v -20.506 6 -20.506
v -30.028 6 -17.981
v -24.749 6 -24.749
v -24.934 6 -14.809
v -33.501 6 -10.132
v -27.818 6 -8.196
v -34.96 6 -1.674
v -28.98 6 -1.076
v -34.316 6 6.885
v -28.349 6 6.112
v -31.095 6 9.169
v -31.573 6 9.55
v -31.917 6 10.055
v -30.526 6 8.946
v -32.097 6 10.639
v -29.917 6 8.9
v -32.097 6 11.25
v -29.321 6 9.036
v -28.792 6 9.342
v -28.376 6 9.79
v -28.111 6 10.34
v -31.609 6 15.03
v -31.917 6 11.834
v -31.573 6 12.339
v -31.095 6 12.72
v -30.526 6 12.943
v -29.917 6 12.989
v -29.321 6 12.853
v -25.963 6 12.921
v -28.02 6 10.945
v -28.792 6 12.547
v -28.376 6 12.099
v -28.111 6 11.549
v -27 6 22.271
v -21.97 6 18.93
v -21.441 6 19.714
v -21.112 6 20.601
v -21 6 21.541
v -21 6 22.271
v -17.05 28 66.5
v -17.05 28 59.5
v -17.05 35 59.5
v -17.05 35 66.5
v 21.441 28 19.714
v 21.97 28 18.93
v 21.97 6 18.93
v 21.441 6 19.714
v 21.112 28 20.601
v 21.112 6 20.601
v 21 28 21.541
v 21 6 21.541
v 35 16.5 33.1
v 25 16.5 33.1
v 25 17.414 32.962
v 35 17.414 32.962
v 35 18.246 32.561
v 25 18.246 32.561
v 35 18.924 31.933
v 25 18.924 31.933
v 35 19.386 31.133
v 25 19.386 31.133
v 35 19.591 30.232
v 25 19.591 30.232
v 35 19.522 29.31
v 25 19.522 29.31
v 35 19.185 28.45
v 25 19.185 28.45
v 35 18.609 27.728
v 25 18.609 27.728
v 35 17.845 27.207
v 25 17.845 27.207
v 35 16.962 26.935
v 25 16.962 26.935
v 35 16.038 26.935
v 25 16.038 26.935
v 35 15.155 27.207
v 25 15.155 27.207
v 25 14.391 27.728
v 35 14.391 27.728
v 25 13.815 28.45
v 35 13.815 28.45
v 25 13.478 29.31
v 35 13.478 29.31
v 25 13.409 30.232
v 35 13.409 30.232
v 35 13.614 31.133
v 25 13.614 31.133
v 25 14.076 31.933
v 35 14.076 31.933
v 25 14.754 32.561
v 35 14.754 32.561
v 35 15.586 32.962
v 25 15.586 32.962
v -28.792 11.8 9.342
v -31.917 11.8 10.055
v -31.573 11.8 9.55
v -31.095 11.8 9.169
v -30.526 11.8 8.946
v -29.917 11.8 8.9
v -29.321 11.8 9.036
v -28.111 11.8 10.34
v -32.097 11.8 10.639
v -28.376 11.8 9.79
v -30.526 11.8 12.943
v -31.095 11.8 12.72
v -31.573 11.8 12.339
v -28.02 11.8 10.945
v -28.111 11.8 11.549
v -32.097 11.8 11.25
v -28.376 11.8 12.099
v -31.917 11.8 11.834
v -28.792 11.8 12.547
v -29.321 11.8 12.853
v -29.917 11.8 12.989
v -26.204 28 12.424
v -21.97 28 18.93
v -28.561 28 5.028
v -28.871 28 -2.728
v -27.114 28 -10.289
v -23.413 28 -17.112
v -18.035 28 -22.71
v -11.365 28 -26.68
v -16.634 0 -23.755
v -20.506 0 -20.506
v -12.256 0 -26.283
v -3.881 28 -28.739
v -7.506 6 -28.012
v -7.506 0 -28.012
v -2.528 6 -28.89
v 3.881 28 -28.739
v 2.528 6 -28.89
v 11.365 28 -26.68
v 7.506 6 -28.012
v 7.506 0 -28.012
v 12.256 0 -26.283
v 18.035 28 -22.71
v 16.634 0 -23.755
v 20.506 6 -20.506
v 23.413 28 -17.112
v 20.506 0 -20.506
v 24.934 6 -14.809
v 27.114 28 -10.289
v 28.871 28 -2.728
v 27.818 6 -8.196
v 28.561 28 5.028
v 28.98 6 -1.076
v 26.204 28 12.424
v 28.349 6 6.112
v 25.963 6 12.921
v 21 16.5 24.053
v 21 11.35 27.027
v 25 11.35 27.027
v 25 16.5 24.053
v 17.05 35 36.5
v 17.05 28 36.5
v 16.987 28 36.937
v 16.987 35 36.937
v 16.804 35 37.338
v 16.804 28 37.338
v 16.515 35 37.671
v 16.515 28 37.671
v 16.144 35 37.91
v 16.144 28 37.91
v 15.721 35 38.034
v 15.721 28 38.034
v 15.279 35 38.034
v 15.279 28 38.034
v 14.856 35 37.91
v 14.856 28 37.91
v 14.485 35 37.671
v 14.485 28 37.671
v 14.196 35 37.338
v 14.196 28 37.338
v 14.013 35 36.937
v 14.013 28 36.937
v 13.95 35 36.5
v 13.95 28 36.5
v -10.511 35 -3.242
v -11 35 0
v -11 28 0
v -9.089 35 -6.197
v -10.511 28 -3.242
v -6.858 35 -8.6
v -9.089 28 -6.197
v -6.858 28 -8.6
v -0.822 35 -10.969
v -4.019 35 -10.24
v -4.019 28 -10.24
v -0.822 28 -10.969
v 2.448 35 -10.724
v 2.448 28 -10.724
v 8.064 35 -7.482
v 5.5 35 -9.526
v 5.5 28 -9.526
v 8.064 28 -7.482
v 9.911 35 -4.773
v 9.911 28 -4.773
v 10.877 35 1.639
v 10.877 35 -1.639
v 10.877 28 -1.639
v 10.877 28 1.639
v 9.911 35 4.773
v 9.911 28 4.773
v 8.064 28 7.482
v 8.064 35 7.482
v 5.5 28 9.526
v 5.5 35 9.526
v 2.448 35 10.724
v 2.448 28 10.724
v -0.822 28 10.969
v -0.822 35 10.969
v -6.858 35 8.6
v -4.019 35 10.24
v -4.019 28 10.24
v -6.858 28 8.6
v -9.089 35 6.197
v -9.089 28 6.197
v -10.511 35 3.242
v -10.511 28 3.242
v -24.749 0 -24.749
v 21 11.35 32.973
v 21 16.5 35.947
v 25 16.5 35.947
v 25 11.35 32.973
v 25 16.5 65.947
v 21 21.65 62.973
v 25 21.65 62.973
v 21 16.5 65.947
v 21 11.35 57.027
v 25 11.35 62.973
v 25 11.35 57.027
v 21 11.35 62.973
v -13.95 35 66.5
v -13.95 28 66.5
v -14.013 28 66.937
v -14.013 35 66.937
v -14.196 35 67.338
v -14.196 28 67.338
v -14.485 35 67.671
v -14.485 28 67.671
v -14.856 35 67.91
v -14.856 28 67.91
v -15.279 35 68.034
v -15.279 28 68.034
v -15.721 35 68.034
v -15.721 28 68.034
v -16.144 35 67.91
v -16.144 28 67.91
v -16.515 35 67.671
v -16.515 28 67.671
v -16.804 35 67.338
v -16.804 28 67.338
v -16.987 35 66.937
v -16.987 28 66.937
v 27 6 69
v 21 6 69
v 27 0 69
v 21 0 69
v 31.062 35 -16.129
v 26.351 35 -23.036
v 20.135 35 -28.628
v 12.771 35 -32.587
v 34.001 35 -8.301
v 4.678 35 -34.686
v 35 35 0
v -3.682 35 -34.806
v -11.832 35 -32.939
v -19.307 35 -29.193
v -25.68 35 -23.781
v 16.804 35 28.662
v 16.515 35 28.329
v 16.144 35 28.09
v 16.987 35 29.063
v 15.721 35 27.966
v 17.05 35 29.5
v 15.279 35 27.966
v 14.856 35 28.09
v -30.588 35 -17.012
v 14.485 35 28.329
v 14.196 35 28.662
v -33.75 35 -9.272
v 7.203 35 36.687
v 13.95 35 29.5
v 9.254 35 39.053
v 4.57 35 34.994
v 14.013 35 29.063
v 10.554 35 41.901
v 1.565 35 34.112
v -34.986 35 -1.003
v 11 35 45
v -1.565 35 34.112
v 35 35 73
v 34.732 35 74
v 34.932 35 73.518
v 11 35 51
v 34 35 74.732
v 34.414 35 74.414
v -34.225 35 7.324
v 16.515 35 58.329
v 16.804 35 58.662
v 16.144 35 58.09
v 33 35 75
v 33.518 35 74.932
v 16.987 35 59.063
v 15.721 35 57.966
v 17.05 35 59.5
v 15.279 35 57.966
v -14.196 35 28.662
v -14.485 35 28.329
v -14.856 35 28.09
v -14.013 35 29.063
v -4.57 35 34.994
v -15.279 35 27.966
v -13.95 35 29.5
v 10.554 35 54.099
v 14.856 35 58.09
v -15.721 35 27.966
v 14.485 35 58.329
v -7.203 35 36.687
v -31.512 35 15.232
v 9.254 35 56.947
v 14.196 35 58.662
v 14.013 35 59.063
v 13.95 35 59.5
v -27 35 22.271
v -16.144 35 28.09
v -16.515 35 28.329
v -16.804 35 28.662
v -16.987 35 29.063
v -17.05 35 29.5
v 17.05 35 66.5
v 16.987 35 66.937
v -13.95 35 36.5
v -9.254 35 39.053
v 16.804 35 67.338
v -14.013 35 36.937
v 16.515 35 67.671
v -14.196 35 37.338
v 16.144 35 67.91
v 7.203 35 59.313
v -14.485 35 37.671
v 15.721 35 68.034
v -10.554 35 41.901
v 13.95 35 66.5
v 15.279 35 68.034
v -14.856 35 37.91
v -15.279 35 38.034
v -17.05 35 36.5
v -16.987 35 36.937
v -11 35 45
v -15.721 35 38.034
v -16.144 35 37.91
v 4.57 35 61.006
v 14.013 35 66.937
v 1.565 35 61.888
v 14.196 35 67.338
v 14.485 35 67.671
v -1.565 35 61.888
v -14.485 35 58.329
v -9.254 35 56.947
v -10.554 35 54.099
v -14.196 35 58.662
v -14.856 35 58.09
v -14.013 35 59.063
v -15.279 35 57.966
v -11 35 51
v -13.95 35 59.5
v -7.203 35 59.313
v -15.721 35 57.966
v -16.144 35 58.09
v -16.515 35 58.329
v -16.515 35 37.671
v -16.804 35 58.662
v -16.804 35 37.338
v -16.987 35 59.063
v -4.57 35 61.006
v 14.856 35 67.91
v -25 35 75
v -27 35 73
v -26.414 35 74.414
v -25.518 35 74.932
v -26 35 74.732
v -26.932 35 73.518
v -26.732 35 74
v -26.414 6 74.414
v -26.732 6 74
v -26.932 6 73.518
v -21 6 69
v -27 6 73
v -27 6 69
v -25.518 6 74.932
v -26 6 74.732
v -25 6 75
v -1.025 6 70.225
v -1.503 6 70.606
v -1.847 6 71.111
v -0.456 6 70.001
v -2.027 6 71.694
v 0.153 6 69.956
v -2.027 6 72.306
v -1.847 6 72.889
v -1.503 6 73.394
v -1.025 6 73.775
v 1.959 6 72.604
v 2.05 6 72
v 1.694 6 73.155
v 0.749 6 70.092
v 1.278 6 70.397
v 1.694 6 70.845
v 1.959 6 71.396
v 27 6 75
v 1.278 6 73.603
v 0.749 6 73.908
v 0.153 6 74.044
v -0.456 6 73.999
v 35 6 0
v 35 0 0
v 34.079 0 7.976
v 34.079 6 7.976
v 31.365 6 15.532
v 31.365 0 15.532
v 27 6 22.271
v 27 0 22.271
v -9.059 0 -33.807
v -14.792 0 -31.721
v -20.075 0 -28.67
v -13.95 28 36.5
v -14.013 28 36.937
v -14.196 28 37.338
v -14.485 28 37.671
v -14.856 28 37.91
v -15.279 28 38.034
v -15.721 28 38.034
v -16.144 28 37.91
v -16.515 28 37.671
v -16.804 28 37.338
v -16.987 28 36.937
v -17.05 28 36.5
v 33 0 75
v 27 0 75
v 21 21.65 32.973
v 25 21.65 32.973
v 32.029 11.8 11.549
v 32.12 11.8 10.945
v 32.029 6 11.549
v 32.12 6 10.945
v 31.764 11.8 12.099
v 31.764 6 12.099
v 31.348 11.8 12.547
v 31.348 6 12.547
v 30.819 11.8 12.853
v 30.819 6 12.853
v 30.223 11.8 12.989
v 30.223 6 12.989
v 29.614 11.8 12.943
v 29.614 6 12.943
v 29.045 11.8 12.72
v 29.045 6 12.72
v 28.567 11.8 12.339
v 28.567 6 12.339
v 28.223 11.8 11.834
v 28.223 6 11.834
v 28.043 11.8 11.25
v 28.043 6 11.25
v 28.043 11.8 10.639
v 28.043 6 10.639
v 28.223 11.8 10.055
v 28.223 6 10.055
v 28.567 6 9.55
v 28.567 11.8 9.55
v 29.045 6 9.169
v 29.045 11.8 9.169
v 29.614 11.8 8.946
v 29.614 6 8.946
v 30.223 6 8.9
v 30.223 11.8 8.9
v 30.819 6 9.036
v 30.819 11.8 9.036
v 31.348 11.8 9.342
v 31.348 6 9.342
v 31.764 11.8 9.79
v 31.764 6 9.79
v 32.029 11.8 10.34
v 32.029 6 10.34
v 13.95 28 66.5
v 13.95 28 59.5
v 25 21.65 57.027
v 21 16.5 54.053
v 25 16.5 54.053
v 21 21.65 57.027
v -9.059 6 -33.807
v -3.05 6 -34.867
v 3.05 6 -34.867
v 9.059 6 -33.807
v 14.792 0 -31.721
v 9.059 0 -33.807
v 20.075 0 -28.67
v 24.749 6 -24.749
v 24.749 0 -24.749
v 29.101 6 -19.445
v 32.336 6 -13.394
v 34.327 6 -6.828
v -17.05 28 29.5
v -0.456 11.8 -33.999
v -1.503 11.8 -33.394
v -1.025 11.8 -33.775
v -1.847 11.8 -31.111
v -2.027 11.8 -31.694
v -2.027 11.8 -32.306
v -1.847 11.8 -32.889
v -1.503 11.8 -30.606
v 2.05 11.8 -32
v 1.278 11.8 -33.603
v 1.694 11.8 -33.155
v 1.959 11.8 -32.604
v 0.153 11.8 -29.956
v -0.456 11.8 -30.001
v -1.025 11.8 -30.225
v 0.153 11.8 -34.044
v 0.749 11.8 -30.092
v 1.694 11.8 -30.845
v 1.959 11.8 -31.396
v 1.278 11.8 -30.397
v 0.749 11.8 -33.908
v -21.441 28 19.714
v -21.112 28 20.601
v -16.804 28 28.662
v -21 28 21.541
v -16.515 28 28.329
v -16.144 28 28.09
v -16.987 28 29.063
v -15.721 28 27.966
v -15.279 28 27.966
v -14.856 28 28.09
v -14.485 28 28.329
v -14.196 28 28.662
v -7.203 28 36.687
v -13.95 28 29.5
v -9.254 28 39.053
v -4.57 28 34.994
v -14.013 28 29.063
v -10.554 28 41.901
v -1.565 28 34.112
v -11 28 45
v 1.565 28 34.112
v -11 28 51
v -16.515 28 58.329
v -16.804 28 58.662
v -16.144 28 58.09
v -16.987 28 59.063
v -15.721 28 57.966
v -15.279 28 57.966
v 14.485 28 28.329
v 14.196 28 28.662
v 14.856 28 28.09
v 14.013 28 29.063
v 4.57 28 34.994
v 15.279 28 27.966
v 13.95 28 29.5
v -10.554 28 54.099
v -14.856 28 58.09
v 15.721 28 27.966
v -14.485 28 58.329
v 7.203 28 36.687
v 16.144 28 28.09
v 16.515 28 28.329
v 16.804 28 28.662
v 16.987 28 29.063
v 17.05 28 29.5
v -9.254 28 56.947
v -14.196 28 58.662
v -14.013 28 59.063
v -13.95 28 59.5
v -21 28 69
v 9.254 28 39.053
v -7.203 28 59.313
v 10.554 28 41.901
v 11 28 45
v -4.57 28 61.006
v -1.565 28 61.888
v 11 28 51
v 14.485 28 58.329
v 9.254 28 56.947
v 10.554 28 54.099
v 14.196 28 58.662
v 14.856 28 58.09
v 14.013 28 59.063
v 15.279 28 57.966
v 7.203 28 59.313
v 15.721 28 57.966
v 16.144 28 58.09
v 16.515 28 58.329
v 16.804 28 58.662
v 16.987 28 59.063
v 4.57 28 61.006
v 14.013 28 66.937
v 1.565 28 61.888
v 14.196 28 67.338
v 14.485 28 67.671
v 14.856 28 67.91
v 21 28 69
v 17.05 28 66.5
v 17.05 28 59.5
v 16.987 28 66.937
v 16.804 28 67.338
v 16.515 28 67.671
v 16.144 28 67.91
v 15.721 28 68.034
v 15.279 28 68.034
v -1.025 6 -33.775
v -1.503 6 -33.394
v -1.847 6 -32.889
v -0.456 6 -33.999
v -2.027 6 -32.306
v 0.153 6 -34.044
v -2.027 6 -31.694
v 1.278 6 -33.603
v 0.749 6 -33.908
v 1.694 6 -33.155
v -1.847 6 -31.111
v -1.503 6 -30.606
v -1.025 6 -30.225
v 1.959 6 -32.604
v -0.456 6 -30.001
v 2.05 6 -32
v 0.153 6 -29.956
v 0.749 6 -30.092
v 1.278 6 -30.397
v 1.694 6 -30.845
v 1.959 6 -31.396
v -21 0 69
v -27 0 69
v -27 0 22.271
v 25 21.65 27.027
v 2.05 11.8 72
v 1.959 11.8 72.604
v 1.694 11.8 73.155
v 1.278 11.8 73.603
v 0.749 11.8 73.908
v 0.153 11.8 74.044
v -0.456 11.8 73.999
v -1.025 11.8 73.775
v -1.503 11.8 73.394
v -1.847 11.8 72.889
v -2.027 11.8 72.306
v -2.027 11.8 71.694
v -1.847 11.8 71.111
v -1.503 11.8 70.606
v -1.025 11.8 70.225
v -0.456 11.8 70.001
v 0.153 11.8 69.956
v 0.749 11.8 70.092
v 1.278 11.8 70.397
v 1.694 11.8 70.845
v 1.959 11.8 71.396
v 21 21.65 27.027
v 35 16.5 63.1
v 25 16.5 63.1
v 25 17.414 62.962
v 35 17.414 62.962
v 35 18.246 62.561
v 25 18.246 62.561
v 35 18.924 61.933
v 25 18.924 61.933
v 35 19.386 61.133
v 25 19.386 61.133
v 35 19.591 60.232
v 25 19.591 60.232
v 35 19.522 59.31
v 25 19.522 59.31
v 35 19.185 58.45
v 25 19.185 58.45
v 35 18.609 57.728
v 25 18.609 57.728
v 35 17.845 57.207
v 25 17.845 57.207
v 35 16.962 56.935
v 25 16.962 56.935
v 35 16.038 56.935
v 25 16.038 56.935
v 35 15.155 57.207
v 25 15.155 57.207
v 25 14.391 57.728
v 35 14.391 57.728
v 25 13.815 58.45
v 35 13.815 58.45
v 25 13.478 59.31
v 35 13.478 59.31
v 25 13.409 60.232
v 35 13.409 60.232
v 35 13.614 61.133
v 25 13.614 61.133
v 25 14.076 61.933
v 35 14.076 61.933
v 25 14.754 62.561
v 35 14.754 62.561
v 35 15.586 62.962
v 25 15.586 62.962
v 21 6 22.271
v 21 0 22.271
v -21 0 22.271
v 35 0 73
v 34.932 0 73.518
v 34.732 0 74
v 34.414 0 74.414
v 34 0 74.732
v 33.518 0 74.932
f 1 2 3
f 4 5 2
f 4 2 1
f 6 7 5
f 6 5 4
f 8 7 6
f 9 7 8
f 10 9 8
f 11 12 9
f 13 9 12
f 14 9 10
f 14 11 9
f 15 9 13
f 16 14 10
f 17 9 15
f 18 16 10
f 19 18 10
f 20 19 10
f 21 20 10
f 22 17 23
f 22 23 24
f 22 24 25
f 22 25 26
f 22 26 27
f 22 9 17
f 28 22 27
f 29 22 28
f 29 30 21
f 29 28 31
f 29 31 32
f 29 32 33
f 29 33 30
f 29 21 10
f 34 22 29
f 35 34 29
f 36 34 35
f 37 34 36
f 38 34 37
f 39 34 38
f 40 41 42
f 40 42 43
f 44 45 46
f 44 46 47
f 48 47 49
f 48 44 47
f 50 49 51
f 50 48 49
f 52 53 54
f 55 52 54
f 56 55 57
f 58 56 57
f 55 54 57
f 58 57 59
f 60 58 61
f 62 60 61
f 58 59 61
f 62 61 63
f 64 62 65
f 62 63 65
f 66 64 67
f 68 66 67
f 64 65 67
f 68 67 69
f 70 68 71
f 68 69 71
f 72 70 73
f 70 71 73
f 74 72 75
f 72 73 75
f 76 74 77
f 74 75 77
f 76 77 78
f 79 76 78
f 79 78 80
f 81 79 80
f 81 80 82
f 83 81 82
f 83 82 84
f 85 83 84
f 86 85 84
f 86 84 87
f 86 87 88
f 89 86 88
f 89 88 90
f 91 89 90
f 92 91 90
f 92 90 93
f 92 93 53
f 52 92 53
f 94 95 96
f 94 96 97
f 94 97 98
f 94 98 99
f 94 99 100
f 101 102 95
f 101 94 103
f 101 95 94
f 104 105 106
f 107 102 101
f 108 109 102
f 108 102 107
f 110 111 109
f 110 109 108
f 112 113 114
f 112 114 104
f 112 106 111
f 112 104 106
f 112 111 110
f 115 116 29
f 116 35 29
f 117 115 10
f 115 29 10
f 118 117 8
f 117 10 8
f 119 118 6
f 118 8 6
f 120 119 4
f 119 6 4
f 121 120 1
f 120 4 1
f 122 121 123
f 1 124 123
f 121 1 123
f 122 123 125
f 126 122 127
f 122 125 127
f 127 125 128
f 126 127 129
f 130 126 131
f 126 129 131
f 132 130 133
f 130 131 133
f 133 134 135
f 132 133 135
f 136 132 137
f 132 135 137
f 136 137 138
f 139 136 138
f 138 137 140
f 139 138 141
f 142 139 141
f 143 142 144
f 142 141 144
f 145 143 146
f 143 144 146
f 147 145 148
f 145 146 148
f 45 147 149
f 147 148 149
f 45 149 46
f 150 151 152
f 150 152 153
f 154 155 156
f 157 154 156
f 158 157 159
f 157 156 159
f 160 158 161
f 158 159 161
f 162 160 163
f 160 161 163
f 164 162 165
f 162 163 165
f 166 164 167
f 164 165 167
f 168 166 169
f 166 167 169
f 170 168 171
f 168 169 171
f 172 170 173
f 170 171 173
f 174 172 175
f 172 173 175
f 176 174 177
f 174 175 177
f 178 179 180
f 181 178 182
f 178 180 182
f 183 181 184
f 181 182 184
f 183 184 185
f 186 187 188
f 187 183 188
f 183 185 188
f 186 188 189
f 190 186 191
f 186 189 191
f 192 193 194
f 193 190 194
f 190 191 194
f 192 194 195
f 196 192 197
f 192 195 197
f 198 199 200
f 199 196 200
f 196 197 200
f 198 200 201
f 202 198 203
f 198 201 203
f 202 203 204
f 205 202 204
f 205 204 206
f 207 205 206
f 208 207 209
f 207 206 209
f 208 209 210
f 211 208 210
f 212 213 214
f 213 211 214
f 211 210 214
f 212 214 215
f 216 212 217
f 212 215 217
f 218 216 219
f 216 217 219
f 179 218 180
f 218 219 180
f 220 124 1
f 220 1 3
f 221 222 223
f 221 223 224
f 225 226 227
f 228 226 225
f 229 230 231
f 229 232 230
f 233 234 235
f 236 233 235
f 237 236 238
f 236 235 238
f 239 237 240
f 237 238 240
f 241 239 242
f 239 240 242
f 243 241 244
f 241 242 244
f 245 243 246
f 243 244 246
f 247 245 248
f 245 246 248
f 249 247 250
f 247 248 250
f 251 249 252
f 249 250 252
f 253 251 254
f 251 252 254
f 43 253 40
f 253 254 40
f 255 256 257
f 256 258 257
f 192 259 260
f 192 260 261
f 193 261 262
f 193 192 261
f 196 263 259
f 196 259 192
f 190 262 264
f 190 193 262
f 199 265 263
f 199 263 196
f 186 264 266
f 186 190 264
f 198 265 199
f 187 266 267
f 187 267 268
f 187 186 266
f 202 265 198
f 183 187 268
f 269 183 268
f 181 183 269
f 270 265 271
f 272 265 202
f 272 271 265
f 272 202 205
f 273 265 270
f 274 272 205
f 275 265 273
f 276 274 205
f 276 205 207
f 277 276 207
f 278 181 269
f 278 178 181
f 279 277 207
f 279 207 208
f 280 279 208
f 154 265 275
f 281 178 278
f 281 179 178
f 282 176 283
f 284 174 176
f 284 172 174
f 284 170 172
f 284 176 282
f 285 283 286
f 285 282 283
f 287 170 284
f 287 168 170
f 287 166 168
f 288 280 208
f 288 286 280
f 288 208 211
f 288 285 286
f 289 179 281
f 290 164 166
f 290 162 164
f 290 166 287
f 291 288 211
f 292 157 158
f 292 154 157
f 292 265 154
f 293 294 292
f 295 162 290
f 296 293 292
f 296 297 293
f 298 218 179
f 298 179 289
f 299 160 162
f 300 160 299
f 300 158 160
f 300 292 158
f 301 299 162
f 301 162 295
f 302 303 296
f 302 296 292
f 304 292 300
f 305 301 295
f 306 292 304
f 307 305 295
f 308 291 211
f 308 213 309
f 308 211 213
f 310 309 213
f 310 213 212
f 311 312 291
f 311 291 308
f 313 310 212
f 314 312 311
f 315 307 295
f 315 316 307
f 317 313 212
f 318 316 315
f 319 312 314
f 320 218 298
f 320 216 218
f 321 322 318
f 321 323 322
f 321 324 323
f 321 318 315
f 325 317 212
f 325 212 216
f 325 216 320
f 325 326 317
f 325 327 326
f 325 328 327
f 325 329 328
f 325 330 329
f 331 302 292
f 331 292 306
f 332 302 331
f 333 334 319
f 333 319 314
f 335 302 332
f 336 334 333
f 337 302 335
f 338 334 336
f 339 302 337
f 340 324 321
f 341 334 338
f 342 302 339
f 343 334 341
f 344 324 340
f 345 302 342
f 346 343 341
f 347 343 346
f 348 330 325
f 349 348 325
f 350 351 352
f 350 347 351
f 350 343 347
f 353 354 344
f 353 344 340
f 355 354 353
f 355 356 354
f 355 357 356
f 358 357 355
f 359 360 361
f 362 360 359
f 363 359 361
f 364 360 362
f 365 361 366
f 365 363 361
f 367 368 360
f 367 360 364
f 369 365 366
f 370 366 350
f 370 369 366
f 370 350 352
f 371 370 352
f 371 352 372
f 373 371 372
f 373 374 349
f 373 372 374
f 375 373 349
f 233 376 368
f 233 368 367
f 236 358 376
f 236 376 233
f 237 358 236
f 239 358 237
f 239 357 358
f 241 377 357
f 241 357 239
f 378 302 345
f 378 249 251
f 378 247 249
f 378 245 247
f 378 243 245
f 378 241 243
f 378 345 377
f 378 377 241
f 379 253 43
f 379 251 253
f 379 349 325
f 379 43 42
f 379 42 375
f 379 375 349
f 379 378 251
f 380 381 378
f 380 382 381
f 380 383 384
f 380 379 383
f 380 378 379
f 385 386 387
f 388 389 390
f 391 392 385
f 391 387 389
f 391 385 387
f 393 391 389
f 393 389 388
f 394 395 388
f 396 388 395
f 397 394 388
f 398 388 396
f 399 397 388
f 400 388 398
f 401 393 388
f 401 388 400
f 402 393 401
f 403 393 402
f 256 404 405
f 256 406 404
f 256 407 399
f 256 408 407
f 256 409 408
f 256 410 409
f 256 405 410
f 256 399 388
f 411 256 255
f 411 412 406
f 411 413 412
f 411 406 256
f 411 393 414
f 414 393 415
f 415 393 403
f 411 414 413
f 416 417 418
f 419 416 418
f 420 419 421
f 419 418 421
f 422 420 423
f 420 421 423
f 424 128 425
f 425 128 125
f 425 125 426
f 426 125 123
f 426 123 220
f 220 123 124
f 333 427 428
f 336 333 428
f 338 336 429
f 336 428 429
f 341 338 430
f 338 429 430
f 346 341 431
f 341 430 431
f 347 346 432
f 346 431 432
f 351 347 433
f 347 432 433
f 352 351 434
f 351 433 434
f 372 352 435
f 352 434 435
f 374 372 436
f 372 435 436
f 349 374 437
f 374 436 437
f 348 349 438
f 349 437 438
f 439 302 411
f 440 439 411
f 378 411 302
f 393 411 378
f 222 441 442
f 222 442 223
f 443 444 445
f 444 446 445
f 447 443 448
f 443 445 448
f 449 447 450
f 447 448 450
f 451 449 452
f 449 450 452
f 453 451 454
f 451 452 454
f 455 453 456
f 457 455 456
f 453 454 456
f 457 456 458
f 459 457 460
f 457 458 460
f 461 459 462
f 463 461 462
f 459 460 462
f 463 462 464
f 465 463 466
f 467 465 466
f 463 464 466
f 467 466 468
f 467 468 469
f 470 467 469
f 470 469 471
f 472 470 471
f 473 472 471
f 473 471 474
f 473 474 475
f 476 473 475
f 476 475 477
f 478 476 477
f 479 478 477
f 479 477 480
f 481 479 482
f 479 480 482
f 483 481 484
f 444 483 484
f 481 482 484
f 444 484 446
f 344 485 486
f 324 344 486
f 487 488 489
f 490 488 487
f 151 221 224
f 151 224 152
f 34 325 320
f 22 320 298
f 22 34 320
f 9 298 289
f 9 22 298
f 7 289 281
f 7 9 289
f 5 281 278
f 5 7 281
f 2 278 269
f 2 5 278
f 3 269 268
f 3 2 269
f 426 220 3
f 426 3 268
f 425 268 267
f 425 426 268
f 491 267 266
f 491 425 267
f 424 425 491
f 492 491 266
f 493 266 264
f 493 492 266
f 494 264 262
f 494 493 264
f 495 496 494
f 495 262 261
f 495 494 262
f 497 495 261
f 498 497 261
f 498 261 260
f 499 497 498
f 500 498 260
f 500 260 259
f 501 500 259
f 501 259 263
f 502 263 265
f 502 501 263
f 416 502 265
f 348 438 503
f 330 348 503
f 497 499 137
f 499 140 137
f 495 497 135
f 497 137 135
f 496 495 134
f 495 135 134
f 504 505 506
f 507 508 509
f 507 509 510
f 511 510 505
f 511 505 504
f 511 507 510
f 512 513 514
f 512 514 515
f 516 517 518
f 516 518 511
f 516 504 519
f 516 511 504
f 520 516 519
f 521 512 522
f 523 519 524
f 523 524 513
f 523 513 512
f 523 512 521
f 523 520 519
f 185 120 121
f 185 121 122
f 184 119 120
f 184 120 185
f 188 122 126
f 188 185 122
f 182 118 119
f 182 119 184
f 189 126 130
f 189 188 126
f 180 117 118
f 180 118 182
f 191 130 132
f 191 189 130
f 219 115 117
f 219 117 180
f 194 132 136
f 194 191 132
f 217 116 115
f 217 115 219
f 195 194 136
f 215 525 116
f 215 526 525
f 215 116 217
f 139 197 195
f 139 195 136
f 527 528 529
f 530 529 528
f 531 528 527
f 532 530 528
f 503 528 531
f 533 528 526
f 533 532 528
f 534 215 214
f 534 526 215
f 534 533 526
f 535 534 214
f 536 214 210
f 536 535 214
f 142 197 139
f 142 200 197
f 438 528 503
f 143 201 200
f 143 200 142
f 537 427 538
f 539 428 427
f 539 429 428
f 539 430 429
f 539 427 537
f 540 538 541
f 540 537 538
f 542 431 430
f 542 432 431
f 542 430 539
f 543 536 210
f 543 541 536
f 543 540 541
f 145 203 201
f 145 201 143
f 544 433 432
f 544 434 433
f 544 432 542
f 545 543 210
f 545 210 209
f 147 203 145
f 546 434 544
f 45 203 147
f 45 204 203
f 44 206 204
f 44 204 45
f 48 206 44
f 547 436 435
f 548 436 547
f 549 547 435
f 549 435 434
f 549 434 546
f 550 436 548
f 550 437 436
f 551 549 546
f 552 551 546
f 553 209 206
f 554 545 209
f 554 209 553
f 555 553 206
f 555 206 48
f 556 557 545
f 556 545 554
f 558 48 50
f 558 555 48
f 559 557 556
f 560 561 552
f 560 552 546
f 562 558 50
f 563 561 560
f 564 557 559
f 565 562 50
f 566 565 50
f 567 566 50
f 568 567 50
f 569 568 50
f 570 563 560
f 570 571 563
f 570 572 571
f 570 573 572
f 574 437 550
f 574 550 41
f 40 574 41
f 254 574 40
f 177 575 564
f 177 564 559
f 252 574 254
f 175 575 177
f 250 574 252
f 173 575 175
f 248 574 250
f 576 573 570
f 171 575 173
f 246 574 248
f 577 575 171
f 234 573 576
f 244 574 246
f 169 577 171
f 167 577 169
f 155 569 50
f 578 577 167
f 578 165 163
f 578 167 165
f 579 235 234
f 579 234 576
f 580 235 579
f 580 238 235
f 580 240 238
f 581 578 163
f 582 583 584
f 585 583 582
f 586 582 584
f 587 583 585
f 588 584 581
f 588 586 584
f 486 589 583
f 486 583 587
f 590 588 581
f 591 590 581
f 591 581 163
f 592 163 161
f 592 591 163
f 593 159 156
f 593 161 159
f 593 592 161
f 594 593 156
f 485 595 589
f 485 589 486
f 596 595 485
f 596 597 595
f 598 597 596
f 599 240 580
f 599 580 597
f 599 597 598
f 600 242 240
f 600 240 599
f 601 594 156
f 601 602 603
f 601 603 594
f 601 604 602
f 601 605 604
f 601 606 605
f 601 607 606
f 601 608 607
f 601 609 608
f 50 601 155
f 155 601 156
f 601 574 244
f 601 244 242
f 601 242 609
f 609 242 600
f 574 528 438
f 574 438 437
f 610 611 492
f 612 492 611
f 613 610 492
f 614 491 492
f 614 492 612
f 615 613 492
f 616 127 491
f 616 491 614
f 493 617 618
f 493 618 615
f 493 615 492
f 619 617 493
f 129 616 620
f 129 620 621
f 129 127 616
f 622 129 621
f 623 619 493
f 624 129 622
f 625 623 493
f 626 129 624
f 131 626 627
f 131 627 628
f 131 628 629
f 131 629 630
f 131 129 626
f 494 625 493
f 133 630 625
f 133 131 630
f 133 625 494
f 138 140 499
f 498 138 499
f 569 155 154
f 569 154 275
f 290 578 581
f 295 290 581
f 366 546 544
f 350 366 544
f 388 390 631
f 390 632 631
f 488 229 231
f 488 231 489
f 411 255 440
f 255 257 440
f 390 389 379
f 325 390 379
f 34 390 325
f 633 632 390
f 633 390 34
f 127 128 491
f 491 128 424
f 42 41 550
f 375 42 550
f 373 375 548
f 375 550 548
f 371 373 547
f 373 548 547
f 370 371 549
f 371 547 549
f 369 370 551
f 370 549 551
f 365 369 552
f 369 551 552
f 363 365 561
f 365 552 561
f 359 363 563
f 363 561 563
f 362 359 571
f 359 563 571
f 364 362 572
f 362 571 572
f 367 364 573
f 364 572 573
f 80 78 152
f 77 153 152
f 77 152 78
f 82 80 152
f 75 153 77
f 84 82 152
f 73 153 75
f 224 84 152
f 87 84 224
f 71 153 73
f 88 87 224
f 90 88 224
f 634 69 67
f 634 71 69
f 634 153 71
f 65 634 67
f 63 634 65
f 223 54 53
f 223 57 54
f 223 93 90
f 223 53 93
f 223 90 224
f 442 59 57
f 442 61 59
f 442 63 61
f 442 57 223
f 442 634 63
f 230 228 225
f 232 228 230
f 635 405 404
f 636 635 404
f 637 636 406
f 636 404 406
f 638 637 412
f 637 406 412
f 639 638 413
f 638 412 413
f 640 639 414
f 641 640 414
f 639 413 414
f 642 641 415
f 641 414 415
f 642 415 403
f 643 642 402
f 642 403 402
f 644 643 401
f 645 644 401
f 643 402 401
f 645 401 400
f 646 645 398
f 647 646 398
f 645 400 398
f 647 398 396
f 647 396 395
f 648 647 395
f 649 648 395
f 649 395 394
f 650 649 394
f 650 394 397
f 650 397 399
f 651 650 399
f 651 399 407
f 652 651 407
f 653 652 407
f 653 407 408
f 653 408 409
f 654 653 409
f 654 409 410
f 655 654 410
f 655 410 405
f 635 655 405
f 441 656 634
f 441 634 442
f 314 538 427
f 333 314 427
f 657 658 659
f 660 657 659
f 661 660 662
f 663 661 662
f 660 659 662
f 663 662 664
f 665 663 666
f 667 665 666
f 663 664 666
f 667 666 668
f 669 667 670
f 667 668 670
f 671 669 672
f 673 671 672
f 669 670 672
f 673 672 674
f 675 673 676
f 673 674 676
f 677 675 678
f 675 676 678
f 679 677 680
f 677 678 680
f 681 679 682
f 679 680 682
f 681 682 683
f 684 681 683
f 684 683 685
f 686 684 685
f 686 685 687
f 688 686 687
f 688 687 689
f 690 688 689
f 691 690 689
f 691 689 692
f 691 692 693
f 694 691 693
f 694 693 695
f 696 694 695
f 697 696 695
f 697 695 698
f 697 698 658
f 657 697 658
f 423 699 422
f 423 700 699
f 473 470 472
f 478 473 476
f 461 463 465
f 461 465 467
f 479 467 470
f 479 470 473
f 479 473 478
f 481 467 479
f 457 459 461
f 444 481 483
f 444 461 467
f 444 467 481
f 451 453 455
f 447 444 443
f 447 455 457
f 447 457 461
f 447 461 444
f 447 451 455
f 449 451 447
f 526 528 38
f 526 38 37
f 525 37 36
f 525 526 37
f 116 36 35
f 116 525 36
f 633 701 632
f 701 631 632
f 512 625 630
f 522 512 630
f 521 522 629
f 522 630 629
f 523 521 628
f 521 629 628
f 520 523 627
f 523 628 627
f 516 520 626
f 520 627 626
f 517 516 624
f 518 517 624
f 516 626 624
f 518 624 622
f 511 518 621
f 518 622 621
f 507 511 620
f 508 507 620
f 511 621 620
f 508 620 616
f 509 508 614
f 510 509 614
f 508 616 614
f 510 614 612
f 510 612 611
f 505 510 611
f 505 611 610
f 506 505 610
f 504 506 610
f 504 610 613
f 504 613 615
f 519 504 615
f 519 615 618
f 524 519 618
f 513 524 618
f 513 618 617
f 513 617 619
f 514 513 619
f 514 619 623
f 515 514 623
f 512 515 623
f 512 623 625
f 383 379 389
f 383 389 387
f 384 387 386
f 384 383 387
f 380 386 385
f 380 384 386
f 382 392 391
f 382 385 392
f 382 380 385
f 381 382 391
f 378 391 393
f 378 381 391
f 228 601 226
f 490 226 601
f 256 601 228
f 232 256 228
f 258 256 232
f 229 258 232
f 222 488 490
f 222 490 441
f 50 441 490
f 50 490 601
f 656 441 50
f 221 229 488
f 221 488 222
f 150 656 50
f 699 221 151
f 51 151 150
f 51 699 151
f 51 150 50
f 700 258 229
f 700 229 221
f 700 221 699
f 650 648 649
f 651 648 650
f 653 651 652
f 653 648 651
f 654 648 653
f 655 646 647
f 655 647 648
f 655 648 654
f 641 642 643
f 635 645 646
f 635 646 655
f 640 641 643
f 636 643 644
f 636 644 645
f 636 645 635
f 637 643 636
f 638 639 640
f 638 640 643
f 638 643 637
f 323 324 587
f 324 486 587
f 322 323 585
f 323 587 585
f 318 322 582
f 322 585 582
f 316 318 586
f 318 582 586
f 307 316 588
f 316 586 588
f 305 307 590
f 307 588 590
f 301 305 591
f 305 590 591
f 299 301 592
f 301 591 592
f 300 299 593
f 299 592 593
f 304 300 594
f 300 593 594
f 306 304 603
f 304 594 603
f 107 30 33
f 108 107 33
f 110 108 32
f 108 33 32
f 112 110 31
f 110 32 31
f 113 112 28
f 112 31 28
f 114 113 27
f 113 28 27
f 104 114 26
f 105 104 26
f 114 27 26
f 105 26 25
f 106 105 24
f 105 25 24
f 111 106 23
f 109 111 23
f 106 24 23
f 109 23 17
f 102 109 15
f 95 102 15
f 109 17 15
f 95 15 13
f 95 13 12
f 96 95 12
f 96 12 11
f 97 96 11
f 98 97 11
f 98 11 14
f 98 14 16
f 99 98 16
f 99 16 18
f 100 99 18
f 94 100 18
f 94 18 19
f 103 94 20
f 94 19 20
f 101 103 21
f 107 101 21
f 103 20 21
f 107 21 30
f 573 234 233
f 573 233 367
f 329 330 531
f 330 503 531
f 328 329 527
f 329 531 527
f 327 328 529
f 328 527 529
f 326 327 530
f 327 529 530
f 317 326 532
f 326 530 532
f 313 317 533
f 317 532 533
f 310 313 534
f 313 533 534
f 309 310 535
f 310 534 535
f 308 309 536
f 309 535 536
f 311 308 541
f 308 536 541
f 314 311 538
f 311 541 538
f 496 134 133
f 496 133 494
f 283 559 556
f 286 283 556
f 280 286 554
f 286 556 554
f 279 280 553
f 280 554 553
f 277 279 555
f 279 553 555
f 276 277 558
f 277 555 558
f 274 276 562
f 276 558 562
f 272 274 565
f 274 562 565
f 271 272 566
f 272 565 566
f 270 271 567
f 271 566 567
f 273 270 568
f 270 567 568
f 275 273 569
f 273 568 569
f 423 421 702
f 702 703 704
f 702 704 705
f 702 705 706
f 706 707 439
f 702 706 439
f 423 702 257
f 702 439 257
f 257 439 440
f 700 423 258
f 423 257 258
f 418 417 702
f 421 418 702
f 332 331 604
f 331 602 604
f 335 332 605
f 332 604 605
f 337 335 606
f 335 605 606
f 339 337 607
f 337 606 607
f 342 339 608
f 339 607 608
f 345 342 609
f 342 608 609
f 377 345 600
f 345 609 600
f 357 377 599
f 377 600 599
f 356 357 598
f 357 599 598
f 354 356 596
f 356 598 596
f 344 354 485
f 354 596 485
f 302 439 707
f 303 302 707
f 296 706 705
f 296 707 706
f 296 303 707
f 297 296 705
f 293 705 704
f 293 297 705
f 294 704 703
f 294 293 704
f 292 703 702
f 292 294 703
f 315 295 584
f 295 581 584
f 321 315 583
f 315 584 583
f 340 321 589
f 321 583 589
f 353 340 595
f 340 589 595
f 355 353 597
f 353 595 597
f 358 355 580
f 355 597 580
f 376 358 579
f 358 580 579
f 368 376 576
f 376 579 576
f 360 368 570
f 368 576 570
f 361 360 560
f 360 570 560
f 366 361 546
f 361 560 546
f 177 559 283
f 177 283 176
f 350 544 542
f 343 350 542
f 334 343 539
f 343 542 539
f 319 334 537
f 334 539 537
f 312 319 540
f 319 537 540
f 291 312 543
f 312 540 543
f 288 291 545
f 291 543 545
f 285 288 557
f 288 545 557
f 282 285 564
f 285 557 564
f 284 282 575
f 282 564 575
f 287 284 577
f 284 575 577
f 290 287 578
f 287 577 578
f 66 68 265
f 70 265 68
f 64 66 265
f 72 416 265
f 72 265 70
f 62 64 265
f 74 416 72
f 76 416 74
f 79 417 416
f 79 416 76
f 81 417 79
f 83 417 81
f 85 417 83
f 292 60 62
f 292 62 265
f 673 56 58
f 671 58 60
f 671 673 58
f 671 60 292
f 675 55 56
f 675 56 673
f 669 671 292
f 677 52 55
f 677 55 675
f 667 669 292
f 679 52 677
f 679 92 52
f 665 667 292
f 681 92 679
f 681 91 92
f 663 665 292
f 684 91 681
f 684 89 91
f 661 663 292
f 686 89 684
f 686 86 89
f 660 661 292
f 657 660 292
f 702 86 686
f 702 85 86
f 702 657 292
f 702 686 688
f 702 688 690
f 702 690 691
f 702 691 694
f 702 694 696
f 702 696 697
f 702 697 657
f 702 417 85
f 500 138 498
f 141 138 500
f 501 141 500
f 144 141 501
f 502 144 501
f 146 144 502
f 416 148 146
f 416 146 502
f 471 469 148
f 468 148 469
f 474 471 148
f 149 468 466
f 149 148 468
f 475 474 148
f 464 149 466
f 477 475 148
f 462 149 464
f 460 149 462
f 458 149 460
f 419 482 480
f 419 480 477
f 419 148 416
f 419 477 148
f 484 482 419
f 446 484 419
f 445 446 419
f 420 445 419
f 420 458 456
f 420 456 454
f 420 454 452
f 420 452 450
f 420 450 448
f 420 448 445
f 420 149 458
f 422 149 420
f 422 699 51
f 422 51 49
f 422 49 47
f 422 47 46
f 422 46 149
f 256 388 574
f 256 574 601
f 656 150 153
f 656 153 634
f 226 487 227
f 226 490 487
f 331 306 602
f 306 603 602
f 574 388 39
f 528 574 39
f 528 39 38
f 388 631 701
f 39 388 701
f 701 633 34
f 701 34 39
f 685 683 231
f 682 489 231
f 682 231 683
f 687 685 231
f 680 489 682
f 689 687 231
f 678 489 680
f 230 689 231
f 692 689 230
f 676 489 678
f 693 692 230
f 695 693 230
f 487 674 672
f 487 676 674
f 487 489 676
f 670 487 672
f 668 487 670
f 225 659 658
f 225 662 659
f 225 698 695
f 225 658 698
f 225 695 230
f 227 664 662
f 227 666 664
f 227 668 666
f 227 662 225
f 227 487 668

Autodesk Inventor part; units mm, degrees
ref_plane "YZ Plane" through (0, 0, 0) normal (1, 0, 0) x (0, 1, 0)
ref_plane "XZ Plane" through (0, 0, 0) normal (0, 1, 0) x (-1, 0, 0)
ref_plane "XY Plane" through (0, 0, 0) normal (0, 0, 1) x (1, 0, 0)
sketch "Boceto1" plane through (0, 0, 0) normal (0, 1, 0) x (-1, 0, 0)
  circle A0 centre (0, 0) radius 11
  arc A1 (-35, 0) -> (27, 22.2711) centre (0, 0) ccw
  line L0 (-35, 0) -> (-35, 75)
  line L1 (-35, 75) -> (27, 75)
  line L2 (27, 75) -> (27, 22.2711)
  arc A2 (-11, 45) -> (11, 45) centre (0, 45) ccw
  arc A3 (11, 51) -> (-11, 51) centre (0, 51) ccw
  line L3 (11, 51) -> (11, 45)
  line L4 (-11, 45) -> (-11, 51)
  line L5 (15.5, 66.5) -> (15.5, 59.5) construction
  line L6 (13.95, 66.5) -> (13.95, 59.5)
  line L7 (17.05, 59.5) -> (17.05, 66.5)
  arc A4 (17.05, 66.5) -> (13.95, 66.5) centre (15.5, 66.5) ccw
  arc A5 (13.95, 59.5) -> (17.05, 59.5) centre (15.5, 59.5) ccw
  line L8 (0, 51) -> (0, 45)
  line L9 (0, 48) -> (2.6814, 48)
  line L10 (15.5, 29.5) -> (15.5, 36.5) construction
  line L11 (13.95, 29.5) -> (13.95, 36.5)
  line L12 (17.05, 36.5) -> (17.05, 29.5)
  arc A6 (13.95, 29.5) -> (17.05, 29.5) centre (15.5, 29.5) ccw
  arc A7 (17.05, 36.5) -> (13.95, 36.5) centre (15.5, 36.5) ccw
  line L13 (-15.5, 66.5) -> (-15.5, 59.5) construction
  line L14 (-13.95, 66.5) -> (-13.95, 59.5)
  line L15 (-17.05, 59.5) -> (-17.05, 66.5)
  arc A8 (-13.95, 66.5) -> (-17.05, 66.5) centre (-15.5, 66.5) ccw
  arc A9 (-17.05, 59.5) -> (-13.95, 59.5) centre (-15.5, 59.5) ccw
  line L16 (-13.95, 29.5) -> (-13.95, 36.5)
  line L17 (-15.5, 29.5) -> (-15.5, 36.5) construction
  line L18 (-17.05, 36.5) -> (-17.05, 29.5)
  arc A10 (-17.05, 29.5) -> (-13.95, 29.5) centre (-15.5, 29.5) ccw
  arc A11 (-13.95, 36.5) -> (-17.05, 36.5) centre (-15.5, 36.5) ccw
  point P0 (15.5, 63)
  point P1 (15.5, 33)
  point P2 (-15.5, 63)
  point P3 (-15.5, 33)
  dimension "d0" = 22
  dimension "d1" = 70
  dimension "d2" = 75
  dimension "d3" = 62
  dimension "d4" = 22
  dimension "d5" = 45
  dimension "d6" = 22
  dimension "d7" = 6
  dimension "d8" = 3.1
  dimension "d9" = 7
  dimension "d10" = 15.5
extrude "Extrusión1" add sketch "Boceto1" along normal blind 35
sketch "Boceto3" plane through (0, 0, 0) normal (0, -1, 0) x (1, 0, 0)
  line L0 (-21, 69) -> (21, 69)
  arc A0 (-21, 20) -> (21, 20) centre (0, 0) ccw
  line L1 (-27, 22.2711) -> (-27, 75) projected
  line L2 (-27, 75) -> (35, 75) projected
  line L3 (35, 75) -> (35, 0) projected
  line L4 (-21, 69) -> (-21, 20)
  line L5 (21, 69) -> (21, 20)
  dimension "d15" = 6
  dimension "d17" = 58
extrude "Extrusión2" cut sketch "Boceto3" against normal blind 28
sketch "Boceto4" plane through (0, 0, 0) normal (0, -1, 0) x (1, 0, 0)
  line L0 (-27, 75) -> (35, 75) projected
  line L1 (-27, 22.2711) -> (-27, 75) projected
  line L2 (27, 75) -> (-27, 75)
  line L3 (-27, 75) -> (-27, 69)
  line L4 (-27, 69) -> (27, 69)
  line L5 (27, 69) -> (27, 75)
  line L6 (-21, 69) -> (21, 69) projected
  line L7 (35, 75) -> (35, 0) projected
  line L8 (-20.5061, -20.5061) -> (-24.7487, -24.7487)
  arc A0 (-27, 22.2711) -> (35, 0) centre (0, 0) ccw projected
  line L9 (8.2115, 0) -> (-7.5561, 0)
  line L10 (-27, 22.2711) -> (-21, 22.2711)
  line L11 (-21, 20) -> (-21, 69) projected
  line L12 (-21, 22.2711) -> (-21, 20)
  arc A1 (-27, 22.2711) -> (-24.7487, -24.7487) centre (0, 0) ccw
  line L13 (20.5061, -20.5061) -> (24.7487, -24.7487)
  line L14 (21, 69) -> (21, 20) projected
  line L15 (21, 22.2711) -> (27, 22.2711)
  line L16 (21, 22.2711) -> (21, 20)
  arc A2 (20.5061, -20.5061) -> (21, 20) centre (0, 0) ccw
  arc A3 (24.7487, -24.7487) -> (27, 22.2711) centre (0, 0) ccw
  circle A4 centre (0, 0) radius 11 projected
  line L17 (0, 2.7283) -> (0, -7.844)
  line L18 (7.5058, -28.0118) -> (9.0587, -33.8074)
  line L19 (-7.5058, -28.0118) -> (-9.0587, -33.8074)
  arc A5 (-7.5058, -28.0118) -> (7.5058, -28.0118) centre (0, 0) ccw
  arc A6 (-9.0587, -33.8074) -> (9.0587, -33.8074) centre (0, 0) ccw
  arc A7 (-21, 20) -> (-20.5061, -20.5061) centre (0, 0) ccw
  dimension "d20" = 0
  dimension "d21" = 8
  dimension "d22" = 45
  dimension "d24" = 35
  dimension "d25" = 45
extrude "Extrusión3" cut sketch "Boceto4" against normal blind 6 contours L0 L5 L4 L1 | L10 L11 A7 L8 A0 | A0 L13 A2 L14 L15 A3 | L19 A5 L18 A0
sketch "Boceto5" plane through (21, 28, 20) normal (-1, 0, 0) x (0, 0, 1)
  line L0 (49, -22) -> (49, 0) projected
  line L1 (2.2711, -22) -> (49, -22)
  circle A0 centre (10, -11.5) radius 3.1
  circle A1 centre (40, -11.5) radius 3.1
  line L2 (55, -22) -> (55, 7) projected
  line L3 (-20, -22) -> (-20, 7) projected
  point P0 (-20, -28)
  dimension "d30" = 6.2
  dimension "d31" = 30
  dimension "d32" = 15
  dimension "d33" = 10.5
  dimension "d34" = 10.5
  dimension "d50" = 30
extrude "Extrusión4" cut sketch "Boceto5" against normal up to next
sketch "Boceto6" plane through (21, 28, 20) normal (-1, 0, 0) x (0, 0, 1)
  circle A0 centre (40, -11.5) radius 3.1 projected
  line L0 (37.0266, -16.65) -> (34.0533, -11.5)
  line L1 (34.0533, -11.5) -> (37.0266, -6.35)
  line L2 (37.0266, -6.35) -> (42.9734, -6.35)
  line L3 (42.9734, -6.35) -> (45.9467, -11.5)
  line L4 (45.9467, -11.5) -> (42.9734, -16.65)
  line L5 (42.9734, -16.65) -> (37.0266, -16.65)
  circle A1 centre (10, -11.5) radius 3.1 projected
  line L6 (7.0266, -16.65) -> (4.0533, -11.5)
  line L7 (4.0533, -11.5) -> (7.0266, -6.35)
  line L8 (7.0266, -6.35) -> (12.9734, -6.35)
  line L9 (12.9734, -6.35) -> (15.9467, -11.5)
  line L10 (15.9467, -11.5) -> (12.9734, -16.65)
  line L11 (12.9734, -16.65) -> (7.0266, -16.65)
  line L12 (49, -28) -> (2.2711, -28) projected
  point P0 (-20, -28)
  dimension "d37" = 10.3
extrude "Extrusión5" cut sketch "Boceto6" against normal blind 4
fillet "Empalme1" radius 2 2 edges at (-27, 20.5, 75) (35, 17.5, 75)
fillet "Empalme2" radius 4 2 edges at (21, 17, 20) (-21, 17, 20)
sketch "Boceto8" plane through (0, 6, 0) normal (0, -1, 0) x (1, 0, 0)
  line L0 (-25, 75) -> (27, 75) projected
  line L1 (27, 75) -> (27, 69) projected
  line L2 (27, 75) -> (27, 69)
  line L3 (27, 69) -> (21, 69)
  line L4 (21, 22.2711) -> (27, 22.2711) projected
  line L5 (21, 69) -> (21, 22.2711)
  line L6 (21, 22.2711) -> (27, 22.2711)
  line L7 (24.7487, -24.7487) -> (20.5061, -20.5061) projected
  line L8 (24.7487, -24.7487) -> (20.5061, -20.5061) projected
  line L9 (20.5061, -20.5061) -> (24.7487, -24.7487)
  line L10 (7.5058, -28.0118) -> (9.0587, -33.8074) projected
  line L11 (7.5058, -28.0118) -> (9.0587, -33.8074)
  line L12 (-9.0587, -33.8074) -> (-7.5058, -28.0118) projected
  line L13 (-7.5058, -28.0118) -> (-9.0587, -33.8074)
  line L14 (-20.5061, -20.5061) -> (-24.7487, -24.7487) projected
  line L15 (-20.5061, -20.5061) -> (-24.7487, -24.7487)
  arc A0 (-27, 22.2711) -> (35, 0) centre (0, 0) ccw projected
  line L16 (-27, 22.2711) -> (-21, 22.2711) projected
  line L17 (-27, 22.2711) -> (-21, 22.2711)
  arc A1 (-27, 22.2711) -> (-24.7487, -24.7487) centre (0, 0) ccw
  arc A2 (-9.0587, -33.8074) -> (9.0587, -33.8074) centre (0, 0) ccw
  arc A3 (24.7487, -24.7487) -> (27, 22.2711) centre (0, 0) ccw
  arc A4 (20.5061, -20.5061) -> (21.9697, 18.9297) centre (0, 0) ccw projected
  arc A5 (7.5058, -28.0118) -> (20.5061, -20.5061) centre (0, 0) ccw
  arc A6 (-20.5061, -20.5061) -> (-7.5058, -28.0118) centre (0, 0) ccw
  circle A7 centre (0, 0) radius 11
  circle A8 centre (0, -32) radius 2 projected
  circle A9 centre (29.8743, 10.8734) radius 2 projected
  circle A10 centre (-29.8743, 10.8734) radius 2 projected
  line L18 (-27, 69) -> (-27, 75)
  line L19 (-27, 69) -> (-27, 73) projected
  line L20 (-27, 75) -> (-25, 75)
  line L21 (-27, 69) -> (-21, 69)
  line L22 (-21, 69) -> (-21, 22.2711)
  line L23 (-21, 21.5407) -> (-21, 69) projected
  line L24 (-27, 22.2711) -> (-21, 22.2711)
  circle A11 centre (0, 72) radius 2 projected
  circle A12 centre (0, 72) radius 2.05
  circle A13 centre (29.8743, 10.8734) radius 2.05
  circle A14 centre (0, -32) radius 2.05
  circle A15 centre (-29.8743, 10.8734) radius 2.05
  dimension "d51" = 6
  dimension "d52" = 46.7289
  dimension "d62" = 4.1
sketch "Boceto10" plane through (0, 6, 0) normal (0, -1, 0) x (1, 0, 0)
  circle A0 centre (0, 72) radius 2.05
  line L0 (6.7845, 0) -> (-6.2714, 0)
  circle A1 centre (0, 0) radius 32
  circle A2 centre (30.0702, 10.9446) radius 2.05
  circle A3 centre (0, -32) radius 2.05
  circle A4 centre (-30.0702, 10.9446) radius 2.05
  circle A5 centre (0, 0) radius 11 projected
  line L1 (0, 0) -> (-30.0702, 10.9446)
  line L2 (0, 0) -> (30.0702, 10.9446)
  line L3 (-25, 75) -> (27, 75) projected
  dimension "d63" = 64
  dimension "d64" = 20
  dimension "d65" = 20
  dimension "d66" = 4.1
  dimension "d69" = 3
extrude "Extrusión8" cut sketch "Boceto10" against normal blind 5.8 contours A0 | A2 L2 A1 | A1 A2 | A3 A1 | A1 A3 | L2 A2 A1 | A4 A1 | A1 L1 A4 | A4 L1 A1
equation "\"d12\" = Altura"
equation "\"Altura\" = 35"
properties part number "Caja reductora - eje z" material "Plastico PETG"
